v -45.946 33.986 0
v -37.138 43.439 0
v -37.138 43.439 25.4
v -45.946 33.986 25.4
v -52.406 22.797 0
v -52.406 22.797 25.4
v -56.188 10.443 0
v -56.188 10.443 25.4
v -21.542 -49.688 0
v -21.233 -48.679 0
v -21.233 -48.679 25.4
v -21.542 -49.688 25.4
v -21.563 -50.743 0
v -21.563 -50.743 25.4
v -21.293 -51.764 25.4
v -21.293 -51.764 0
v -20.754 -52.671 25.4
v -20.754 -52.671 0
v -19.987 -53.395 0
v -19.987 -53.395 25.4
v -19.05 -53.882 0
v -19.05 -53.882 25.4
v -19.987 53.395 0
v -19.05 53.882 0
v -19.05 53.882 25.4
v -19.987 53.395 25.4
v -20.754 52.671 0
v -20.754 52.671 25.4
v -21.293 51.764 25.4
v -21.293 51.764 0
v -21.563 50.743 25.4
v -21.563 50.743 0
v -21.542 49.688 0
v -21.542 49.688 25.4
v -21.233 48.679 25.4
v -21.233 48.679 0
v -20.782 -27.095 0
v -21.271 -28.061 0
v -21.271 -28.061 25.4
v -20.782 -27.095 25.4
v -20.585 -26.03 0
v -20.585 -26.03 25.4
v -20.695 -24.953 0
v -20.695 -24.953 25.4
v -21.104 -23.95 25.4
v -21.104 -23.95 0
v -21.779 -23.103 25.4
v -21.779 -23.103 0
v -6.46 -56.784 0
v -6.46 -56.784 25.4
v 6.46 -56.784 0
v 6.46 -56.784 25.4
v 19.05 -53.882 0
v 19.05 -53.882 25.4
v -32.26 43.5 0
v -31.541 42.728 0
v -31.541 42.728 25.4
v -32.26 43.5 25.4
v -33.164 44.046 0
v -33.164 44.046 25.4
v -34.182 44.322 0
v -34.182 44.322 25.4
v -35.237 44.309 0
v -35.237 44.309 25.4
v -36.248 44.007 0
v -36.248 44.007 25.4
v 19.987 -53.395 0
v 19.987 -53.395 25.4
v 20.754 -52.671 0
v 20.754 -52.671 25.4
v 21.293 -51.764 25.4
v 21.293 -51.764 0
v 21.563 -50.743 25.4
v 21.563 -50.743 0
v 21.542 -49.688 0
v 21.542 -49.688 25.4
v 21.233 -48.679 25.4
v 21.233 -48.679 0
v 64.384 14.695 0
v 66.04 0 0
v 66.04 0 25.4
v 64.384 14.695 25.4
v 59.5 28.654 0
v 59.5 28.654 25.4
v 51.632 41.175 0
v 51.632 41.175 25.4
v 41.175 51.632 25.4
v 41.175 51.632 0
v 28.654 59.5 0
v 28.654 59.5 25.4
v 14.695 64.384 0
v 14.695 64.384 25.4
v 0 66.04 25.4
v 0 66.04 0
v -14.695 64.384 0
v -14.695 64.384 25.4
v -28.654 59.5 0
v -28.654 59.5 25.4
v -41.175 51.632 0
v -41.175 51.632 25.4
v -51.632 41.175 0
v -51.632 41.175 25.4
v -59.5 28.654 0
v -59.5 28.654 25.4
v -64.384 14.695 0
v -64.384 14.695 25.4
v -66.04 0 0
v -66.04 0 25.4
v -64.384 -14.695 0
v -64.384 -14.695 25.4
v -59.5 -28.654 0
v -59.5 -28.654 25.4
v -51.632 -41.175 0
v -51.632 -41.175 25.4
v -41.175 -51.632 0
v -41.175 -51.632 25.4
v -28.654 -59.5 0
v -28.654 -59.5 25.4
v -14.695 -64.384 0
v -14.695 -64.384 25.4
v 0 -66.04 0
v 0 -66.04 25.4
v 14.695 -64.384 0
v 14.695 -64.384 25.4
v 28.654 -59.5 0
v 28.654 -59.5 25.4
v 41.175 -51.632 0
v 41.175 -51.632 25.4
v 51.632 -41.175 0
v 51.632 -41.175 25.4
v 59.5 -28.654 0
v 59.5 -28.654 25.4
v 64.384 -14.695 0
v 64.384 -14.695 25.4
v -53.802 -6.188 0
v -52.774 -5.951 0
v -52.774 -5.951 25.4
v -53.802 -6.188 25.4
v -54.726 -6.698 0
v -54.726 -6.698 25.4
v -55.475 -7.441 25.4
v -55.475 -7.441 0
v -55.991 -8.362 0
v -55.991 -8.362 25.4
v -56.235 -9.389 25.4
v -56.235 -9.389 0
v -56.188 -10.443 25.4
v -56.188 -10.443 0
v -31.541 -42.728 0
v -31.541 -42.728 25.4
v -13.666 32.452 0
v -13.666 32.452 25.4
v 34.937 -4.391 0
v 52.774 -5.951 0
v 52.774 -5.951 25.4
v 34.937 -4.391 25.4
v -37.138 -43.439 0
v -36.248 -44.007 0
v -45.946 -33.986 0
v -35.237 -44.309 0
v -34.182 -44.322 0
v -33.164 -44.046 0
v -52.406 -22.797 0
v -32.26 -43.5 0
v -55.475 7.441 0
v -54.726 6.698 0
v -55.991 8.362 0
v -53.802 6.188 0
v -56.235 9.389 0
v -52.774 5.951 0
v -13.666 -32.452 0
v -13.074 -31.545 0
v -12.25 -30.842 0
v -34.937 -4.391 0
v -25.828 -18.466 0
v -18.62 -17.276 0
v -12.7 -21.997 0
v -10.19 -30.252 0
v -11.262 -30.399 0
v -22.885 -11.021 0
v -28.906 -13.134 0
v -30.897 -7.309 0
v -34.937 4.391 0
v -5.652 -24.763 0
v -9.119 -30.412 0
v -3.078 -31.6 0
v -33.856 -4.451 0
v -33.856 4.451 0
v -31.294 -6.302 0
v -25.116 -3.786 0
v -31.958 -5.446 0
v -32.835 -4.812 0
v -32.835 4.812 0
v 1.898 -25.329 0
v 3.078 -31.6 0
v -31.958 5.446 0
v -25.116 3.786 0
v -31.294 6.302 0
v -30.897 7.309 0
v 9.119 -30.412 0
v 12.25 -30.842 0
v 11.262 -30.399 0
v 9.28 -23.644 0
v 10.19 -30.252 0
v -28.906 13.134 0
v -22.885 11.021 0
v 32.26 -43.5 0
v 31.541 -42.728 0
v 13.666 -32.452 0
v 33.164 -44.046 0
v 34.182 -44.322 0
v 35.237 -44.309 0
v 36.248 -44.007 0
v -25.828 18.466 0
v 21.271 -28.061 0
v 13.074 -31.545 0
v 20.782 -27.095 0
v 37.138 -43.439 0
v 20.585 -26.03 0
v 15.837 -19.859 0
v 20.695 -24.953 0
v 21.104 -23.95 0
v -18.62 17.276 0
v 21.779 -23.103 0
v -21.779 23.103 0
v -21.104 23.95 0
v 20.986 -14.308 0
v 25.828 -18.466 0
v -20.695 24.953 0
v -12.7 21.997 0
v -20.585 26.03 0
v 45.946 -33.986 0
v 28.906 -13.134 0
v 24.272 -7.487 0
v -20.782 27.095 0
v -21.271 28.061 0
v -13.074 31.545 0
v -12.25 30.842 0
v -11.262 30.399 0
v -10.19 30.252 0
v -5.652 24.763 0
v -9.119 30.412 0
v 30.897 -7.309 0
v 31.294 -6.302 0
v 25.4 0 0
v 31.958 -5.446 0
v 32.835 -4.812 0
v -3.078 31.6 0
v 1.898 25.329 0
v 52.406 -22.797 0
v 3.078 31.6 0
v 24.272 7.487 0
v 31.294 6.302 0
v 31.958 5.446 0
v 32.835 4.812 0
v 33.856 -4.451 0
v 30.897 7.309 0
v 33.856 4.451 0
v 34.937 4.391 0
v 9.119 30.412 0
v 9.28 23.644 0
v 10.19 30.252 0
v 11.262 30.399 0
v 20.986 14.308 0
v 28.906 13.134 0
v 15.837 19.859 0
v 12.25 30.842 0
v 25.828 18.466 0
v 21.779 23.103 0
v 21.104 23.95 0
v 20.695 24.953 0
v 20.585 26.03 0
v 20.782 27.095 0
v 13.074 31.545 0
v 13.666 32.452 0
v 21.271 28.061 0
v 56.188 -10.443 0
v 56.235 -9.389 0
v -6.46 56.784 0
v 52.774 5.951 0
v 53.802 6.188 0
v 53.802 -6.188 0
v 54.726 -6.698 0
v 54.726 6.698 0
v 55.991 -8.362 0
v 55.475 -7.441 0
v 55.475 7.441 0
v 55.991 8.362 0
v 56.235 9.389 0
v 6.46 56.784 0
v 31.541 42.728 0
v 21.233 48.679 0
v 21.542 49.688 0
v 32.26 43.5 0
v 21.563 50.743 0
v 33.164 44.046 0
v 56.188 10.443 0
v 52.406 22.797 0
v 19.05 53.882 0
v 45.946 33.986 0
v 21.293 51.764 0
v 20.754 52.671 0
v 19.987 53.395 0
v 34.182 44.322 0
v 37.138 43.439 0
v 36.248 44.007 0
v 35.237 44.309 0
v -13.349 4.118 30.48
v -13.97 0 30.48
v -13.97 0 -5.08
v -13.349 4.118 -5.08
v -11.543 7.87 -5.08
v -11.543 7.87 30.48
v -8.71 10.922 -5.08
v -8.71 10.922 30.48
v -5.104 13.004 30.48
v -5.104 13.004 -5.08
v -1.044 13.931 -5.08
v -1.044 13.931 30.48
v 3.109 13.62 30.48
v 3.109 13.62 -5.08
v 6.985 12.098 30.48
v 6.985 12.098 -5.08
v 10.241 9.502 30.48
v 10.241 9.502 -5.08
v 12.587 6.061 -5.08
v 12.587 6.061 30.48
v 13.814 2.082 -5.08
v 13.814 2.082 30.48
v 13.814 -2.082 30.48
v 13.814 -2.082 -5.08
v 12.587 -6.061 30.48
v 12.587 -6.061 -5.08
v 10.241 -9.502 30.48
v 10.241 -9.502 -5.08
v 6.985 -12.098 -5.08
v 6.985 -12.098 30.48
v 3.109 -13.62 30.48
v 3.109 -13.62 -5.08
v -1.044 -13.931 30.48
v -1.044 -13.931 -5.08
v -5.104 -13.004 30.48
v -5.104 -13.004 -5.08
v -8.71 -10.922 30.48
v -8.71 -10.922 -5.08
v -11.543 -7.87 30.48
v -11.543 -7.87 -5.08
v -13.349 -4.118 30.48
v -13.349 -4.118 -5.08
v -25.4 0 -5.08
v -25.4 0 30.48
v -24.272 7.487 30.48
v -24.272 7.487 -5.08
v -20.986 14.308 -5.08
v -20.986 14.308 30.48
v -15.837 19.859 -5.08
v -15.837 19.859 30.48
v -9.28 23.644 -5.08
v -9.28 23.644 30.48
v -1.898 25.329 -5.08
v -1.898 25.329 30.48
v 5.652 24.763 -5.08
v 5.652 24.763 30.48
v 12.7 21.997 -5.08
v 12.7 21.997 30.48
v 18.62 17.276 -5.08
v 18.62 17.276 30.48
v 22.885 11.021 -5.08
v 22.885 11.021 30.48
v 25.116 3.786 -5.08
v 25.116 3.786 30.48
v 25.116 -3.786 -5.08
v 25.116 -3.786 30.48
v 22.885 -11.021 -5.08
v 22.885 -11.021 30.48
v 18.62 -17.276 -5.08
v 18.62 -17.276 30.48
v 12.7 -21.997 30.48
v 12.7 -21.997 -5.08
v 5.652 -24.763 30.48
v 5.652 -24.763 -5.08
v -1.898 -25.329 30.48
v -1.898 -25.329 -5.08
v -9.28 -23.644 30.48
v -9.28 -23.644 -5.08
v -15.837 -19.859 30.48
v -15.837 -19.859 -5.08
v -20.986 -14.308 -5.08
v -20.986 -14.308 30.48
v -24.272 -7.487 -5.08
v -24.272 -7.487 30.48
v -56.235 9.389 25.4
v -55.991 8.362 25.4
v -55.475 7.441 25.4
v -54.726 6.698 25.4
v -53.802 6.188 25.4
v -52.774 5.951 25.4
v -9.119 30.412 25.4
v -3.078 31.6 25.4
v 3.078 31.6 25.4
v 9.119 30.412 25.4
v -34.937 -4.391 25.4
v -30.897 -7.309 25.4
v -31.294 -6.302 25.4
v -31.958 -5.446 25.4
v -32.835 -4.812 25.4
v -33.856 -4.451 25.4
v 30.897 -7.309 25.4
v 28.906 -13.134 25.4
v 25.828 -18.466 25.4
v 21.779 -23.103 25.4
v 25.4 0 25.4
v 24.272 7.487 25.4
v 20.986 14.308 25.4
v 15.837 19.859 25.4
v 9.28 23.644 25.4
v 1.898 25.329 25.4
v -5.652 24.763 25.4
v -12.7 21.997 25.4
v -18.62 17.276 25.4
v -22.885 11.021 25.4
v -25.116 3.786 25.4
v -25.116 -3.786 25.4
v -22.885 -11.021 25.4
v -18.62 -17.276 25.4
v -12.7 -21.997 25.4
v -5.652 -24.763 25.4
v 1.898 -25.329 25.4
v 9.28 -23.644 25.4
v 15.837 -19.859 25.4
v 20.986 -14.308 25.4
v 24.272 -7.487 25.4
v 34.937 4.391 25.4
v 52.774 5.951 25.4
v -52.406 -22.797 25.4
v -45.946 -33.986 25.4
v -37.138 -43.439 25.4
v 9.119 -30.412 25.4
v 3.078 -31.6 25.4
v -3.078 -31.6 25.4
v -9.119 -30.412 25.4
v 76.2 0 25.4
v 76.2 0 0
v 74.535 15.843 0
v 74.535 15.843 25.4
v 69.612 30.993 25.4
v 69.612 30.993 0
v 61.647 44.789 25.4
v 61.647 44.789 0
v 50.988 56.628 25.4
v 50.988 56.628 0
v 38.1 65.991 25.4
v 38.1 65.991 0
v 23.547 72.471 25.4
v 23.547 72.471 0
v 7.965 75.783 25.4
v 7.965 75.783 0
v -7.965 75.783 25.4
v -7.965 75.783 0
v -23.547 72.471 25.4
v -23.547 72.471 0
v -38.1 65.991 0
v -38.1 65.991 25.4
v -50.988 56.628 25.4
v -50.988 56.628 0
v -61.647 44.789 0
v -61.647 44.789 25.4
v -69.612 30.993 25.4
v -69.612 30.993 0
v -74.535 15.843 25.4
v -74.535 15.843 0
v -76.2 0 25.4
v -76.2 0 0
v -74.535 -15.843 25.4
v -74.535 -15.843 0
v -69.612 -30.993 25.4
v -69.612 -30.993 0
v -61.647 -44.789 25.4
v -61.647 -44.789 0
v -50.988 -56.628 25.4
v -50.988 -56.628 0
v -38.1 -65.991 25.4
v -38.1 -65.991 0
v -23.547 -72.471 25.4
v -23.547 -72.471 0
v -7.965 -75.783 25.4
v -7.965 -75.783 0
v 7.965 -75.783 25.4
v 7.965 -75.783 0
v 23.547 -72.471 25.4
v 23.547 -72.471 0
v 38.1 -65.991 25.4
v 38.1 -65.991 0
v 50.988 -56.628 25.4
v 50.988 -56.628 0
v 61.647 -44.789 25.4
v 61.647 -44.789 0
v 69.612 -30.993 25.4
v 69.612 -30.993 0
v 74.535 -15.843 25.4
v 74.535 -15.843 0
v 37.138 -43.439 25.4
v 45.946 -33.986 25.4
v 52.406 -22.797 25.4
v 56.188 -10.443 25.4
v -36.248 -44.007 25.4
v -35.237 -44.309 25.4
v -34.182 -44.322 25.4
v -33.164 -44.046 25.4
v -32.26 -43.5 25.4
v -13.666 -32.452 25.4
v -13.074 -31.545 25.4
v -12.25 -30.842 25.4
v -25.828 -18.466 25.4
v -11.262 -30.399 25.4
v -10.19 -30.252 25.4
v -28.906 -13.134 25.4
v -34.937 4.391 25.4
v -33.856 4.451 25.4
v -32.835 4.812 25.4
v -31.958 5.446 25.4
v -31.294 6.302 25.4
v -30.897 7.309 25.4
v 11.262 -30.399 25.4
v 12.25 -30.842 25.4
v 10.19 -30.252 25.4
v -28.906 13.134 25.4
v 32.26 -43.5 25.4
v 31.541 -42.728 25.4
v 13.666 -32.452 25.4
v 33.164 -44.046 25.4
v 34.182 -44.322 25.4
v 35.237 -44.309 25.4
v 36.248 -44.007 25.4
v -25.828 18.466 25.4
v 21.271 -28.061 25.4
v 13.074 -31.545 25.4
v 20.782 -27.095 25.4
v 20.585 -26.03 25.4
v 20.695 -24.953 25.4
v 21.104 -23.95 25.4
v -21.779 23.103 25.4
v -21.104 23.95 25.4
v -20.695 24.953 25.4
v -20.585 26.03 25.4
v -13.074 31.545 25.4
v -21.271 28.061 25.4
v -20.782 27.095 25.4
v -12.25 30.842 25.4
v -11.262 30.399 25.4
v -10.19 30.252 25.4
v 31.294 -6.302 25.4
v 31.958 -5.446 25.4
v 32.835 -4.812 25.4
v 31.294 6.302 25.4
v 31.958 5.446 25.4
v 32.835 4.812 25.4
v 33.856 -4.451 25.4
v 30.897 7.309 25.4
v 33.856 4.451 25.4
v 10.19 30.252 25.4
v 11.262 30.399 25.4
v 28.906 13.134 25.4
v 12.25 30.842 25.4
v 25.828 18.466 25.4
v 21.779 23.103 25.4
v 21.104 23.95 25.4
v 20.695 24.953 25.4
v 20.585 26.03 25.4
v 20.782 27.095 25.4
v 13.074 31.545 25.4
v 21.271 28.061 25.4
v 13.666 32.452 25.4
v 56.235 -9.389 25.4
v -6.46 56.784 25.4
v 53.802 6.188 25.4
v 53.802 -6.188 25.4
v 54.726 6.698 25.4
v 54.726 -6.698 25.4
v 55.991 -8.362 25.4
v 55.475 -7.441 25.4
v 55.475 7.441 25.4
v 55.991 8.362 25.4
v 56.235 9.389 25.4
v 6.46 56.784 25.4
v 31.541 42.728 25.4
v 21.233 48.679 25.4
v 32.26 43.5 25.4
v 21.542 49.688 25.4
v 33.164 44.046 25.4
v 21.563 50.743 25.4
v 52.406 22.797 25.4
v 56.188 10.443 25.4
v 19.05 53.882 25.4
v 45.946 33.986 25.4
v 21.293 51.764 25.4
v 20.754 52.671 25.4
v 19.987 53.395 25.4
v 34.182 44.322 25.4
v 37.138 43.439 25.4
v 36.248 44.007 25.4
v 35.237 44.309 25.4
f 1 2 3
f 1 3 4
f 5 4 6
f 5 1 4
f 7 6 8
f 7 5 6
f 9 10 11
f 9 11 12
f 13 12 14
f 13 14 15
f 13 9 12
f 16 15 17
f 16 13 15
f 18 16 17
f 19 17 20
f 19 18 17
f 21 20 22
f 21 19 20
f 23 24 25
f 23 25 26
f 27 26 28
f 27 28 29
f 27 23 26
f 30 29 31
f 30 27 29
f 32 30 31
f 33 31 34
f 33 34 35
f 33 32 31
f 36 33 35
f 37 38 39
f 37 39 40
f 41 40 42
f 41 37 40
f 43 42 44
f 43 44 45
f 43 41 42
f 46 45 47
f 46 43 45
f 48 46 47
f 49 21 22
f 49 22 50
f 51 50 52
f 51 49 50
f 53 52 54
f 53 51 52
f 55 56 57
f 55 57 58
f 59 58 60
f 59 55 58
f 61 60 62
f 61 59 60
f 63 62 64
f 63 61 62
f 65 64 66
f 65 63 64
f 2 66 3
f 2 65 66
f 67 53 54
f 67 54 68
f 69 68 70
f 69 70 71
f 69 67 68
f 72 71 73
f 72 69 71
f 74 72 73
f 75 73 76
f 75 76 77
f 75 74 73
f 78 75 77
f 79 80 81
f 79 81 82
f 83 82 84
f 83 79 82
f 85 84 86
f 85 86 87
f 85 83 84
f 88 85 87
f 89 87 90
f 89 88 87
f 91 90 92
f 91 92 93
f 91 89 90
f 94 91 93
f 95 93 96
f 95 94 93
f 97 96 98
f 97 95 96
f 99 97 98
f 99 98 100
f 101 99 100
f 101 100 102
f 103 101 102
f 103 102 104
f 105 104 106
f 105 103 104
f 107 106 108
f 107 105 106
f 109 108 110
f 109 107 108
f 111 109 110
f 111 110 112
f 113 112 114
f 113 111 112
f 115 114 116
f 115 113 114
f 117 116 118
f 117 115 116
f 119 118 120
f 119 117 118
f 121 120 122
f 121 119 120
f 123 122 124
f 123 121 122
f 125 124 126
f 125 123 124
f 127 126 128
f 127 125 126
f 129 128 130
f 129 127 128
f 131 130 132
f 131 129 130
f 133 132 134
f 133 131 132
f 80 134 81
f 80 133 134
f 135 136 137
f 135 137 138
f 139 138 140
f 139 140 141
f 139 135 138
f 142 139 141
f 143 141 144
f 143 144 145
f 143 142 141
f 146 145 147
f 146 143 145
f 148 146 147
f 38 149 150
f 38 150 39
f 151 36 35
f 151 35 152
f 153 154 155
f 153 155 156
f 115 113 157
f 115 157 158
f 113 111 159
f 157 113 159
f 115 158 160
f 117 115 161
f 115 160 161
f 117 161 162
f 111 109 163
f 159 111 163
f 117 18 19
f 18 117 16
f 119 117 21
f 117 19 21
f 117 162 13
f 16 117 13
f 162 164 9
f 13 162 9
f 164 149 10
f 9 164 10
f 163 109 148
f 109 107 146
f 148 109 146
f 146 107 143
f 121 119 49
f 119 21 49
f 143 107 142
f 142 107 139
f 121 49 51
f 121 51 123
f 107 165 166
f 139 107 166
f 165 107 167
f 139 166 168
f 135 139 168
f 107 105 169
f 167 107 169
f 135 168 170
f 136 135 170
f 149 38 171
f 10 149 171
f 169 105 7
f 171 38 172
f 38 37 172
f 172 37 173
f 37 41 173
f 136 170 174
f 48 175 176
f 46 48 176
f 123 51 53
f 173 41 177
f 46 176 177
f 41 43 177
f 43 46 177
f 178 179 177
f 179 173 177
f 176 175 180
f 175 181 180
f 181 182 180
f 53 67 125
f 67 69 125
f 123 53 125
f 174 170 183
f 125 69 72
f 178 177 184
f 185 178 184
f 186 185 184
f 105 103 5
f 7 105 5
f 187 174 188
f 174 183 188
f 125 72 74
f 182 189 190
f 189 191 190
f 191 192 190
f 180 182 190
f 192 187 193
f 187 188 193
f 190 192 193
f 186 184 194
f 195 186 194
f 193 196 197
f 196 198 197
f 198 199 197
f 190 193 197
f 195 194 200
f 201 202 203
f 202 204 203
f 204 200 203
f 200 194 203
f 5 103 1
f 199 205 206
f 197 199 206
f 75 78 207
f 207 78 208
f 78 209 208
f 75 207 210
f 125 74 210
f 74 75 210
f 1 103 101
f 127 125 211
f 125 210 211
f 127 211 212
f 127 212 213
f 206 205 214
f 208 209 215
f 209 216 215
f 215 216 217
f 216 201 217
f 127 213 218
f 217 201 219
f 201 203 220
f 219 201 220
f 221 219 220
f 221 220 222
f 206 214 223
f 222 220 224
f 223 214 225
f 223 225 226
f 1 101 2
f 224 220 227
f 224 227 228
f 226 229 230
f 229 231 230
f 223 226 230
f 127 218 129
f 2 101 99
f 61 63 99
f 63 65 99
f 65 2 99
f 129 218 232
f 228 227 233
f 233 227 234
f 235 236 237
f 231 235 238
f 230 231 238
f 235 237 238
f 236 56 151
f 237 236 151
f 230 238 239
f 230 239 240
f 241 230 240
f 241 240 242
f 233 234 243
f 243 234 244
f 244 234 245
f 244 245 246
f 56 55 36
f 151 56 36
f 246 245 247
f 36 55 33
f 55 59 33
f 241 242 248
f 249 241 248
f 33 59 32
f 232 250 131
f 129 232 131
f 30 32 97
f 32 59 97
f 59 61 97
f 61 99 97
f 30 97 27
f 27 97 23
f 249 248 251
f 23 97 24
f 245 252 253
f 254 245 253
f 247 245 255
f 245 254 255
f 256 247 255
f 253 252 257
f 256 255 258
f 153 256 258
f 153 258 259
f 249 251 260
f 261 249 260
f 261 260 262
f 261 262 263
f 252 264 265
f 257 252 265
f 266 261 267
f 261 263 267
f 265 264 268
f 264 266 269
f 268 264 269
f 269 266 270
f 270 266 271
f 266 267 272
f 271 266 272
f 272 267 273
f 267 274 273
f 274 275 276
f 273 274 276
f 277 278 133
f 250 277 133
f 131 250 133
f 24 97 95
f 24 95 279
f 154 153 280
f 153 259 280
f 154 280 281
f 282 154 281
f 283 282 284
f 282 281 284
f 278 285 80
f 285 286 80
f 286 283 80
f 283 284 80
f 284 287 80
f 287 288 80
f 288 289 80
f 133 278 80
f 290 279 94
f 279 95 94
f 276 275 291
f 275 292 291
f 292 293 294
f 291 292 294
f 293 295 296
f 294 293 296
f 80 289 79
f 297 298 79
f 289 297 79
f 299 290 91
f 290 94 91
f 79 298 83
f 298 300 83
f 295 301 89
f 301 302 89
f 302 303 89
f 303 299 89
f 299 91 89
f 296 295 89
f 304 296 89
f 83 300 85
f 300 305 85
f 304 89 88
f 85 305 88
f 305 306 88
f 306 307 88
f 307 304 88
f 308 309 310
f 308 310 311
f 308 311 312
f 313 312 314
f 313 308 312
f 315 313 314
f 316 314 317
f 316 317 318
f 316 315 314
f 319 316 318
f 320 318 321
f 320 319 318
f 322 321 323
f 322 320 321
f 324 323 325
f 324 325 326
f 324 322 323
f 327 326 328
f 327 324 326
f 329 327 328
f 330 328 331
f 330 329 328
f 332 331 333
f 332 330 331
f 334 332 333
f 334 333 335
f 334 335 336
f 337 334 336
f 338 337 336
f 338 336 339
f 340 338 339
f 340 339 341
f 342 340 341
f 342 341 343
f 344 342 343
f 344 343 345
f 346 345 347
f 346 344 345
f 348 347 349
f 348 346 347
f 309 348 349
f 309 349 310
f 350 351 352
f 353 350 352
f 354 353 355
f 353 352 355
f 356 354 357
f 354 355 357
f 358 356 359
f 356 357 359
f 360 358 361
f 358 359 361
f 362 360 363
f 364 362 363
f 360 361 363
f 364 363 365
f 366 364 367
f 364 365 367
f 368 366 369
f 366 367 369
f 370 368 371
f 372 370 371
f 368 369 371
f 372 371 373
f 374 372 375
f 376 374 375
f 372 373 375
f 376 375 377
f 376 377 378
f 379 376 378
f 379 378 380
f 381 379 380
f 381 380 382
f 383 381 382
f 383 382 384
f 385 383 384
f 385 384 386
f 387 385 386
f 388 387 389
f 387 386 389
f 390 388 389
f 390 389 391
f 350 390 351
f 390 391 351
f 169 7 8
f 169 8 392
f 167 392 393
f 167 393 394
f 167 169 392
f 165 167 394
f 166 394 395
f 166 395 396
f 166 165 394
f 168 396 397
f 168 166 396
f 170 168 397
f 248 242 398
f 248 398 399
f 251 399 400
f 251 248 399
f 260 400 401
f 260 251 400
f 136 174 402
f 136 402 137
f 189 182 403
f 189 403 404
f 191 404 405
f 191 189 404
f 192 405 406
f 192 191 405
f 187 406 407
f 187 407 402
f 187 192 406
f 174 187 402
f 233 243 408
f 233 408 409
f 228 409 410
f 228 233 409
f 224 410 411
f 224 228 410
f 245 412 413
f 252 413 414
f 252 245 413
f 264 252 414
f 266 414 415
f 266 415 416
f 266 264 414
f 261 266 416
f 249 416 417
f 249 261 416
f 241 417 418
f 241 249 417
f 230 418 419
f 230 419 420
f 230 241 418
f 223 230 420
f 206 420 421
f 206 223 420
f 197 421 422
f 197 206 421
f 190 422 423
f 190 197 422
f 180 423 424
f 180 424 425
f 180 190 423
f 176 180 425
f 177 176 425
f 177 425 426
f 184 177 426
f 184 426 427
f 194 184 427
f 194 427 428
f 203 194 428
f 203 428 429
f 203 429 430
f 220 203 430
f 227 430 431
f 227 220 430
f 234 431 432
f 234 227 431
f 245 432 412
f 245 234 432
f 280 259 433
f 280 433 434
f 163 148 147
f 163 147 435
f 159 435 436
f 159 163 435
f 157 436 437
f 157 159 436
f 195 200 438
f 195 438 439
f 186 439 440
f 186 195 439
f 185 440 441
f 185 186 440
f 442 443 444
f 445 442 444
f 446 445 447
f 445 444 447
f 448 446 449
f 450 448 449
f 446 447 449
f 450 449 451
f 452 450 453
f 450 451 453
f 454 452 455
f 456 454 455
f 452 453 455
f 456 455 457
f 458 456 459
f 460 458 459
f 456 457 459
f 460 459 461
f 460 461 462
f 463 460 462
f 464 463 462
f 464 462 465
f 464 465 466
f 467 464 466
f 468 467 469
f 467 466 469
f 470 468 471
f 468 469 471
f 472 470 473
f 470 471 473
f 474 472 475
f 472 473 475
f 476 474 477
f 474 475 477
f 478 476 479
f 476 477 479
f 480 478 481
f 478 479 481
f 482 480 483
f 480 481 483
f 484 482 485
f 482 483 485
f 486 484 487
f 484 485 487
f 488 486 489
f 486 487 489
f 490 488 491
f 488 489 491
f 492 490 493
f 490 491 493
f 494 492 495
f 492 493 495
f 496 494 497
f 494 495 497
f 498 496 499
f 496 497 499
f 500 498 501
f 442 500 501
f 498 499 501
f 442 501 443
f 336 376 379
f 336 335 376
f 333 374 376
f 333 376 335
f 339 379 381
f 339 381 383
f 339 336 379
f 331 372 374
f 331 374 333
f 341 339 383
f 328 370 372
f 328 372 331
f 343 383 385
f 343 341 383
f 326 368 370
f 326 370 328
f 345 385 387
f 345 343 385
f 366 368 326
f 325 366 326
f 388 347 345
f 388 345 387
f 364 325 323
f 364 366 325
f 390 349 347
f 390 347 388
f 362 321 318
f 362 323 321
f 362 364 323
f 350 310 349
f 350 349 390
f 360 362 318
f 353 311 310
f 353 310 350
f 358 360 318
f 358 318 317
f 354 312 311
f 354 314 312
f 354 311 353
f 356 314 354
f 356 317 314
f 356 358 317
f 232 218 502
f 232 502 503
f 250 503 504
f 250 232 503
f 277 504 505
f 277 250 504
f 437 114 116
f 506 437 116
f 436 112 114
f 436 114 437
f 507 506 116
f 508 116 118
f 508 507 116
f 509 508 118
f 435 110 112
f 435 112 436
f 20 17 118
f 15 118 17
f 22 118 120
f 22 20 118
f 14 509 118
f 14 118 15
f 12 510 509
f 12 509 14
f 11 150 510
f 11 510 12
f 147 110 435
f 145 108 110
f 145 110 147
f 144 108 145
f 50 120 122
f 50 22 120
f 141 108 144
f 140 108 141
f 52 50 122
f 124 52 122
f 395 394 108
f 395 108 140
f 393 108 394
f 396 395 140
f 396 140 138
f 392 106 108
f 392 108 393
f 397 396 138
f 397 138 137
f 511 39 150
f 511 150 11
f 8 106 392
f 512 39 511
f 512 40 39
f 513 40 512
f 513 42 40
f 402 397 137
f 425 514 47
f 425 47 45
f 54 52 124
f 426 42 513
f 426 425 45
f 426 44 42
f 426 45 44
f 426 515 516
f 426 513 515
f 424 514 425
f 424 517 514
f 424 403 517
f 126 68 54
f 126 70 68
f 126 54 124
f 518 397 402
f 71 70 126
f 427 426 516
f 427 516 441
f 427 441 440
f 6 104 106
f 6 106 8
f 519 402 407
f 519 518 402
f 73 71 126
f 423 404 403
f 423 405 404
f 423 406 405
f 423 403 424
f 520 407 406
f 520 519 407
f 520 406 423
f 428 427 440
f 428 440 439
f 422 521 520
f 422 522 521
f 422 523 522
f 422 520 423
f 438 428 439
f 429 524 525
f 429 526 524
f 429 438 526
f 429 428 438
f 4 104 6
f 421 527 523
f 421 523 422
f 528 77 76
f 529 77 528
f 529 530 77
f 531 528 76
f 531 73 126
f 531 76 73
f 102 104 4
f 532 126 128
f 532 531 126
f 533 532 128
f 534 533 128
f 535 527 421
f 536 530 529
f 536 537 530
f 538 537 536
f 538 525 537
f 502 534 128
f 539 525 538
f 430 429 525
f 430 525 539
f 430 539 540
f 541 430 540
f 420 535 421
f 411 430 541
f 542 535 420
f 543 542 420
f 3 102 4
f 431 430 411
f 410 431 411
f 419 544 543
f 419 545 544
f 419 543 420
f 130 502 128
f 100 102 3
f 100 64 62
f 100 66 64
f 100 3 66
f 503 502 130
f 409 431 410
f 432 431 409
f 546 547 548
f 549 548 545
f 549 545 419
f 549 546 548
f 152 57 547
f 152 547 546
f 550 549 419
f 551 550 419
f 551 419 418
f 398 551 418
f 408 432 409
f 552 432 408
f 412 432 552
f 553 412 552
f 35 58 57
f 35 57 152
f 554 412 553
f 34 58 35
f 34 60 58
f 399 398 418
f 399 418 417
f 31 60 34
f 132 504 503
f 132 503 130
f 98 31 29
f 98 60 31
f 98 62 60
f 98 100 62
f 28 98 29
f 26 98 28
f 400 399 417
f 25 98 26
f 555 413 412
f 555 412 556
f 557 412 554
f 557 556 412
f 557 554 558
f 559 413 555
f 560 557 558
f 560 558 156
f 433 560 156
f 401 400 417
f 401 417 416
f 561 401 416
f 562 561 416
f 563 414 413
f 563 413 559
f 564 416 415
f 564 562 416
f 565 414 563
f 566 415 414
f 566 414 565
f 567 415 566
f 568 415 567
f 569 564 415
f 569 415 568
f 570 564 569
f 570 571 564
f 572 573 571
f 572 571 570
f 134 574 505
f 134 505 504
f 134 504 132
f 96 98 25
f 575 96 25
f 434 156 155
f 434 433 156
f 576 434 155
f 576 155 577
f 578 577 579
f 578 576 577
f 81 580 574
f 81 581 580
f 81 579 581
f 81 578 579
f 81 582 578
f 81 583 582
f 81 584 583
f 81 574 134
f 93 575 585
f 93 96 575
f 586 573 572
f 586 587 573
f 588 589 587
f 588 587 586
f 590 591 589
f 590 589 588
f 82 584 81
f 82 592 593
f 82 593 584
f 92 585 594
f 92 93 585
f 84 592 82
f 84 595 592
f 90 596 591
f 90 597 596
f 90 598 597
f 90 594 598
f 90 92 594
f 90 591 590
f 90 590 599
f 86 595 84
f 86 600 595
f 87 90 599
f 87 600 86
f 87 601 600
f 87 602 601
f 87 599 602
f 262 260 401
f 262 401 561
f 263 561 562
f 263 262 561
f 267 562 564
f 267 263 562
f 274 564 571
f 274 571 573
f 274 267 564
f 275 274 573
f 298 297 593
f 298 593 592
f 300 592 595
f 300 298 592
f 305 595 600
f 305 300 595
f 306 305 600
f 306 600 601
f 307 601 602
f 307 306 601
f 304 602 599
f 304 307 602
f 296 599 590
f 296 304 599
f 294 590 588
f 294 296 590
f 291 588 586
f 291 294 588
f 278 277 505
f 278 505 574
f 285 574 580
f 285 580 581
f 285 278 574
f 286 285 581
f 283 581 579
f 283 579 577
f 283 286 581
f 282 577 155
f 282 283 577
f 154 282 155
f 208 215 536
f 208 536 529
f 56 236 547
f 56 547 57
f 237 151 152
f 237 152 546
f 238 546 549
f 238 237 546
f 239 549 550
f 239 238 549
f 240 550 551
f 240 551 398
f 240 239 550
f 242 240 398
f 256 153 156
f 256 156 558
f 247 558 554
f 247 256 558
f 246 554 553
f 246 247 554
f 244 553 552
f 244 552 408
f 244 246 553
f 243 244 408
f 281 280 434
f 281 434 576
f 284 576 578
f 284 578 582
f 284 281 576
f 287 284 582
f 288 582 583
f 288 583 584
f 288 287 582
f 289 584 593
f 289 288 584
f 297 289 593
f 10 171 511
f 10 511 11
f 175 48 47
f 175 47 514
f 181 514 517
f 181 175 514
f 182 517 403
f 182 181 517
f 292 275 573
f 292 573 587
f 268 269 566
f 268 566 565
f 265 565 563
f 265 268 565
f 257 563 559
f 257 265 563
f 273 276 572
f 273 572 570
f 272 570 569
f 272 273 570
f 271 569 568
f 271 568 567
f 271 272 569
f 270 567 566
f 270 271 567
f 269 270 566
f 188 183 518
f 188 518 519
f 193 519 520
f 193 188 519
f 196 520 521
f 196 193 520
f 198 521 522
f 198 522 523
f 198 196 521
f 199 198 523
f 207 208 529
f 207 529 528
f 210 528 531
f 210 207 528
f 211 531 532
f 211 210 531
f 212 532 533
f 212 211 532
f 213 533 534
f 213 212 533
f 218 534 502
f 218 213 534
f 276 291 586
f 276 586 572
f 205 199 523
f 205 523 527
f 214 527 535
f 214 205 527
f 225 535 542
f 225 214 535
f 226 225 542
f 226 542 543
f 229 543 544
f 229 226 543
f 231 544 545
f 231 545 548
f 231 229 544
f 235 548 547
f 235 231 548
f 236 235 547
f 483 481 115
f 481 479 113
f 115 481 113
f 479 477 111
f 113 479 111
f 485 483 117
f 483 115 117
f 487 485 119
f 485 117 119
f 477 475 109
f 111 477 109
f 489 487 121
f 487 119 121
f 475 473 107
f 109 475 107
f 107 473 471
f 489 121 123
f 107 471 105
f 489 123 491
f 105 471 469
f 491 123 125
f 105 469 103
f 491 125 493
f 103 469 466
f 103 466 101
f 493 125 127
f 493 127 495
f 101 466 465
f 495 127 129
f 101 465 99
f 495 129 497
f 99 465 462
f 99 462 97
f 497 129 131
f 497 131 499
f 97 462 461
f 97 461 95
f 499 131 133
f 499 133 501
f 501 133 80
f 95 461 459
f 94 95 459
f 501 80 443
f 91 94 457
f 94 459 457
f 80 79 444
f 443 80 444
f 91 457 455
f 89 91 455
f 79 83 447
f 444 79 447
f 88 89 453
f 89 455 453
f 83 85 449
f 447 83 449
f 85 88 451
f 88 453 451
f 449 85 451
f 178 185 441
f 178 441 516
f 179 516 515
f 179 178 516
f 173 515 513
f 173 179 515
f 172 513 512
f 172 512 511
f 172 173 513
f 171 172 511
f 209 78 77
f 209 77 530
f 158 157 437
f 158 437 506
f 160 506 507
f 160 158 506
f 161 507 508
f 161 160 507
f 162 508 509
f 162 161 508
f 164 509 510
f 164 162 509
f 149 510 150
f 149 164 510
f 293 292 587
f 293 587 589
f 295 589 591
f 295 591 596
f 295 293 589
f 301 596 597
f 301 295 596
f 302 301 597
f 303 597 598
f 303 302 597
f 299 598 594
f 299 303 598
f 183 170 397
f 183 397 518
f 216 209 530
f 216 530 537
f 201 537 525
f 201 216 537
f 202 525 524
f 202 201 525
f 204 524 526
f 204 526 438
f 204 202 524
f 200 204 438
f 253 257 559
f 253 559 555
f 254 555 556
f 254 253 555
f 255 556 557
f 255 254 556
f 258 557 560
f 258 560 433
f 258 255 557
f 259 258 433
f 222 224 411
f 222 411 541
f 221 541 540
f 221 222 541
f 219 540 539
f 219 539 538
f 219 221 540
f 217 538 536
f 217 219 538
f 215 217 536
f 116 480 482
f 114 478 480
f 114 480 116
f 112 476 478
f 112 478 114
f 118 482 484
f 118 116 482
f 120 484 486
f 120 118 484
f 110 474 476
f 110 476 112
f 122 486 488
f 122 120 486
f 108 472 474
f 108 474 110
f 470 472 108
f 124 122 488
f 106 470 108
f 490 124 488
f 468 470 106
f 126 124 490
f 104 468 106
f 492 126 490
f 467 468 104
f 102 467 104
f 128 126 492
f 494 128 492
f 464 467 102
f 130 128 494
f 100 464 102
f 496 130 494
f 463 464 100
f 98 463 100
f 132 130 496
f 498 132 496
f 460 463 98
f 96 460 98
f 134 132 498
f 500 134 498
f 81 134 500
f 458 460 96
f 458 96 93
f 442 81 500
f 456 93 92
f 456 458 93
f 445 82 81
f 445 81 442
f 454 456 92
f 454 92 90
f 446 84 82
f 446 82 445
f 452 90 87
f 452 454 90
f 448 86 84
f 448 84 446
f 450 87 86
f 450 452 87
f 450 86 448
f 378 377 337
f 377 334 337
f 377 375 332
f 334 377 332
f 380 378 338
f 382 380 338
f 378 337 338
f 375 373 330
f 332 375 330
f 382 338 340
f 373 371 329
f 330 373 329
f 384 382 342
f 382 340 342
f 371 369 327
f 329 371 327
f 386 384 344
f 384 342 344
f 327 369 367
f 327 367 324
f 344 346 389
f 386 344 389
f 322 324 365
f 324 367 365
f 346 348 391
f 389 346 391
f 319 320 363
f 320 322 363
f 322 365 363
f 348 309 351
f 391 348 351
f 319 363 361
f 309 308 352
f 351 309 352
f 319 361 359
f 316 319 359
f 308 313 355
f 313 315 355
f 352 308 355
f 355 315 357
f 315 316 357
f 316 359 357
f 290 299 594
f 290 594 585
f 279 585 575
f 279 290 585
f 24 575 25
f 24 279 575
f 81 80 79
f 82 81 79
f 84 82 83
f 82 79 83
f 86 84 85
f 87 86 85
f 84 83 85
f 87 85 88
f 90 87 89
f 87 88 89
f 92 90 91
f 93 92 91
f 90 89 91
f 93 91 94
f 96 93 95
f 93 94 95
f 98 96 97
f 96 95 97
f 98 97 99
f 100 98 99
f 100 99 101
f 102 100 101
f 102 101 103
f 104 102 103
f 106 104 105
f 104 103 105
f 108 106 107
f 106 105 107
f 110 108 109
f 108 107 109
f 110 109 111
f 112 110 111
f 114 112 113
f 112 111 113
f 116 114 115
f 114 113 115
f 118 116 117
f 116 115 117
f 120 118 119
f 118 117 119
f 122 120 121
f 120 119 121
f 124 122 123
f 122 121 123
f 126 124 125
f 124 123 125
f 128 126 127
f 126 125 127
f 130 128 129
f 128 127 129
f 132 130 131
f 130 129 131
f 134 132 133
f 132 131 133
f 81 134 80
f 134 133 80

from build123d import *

# Parameters (mm, degrees)
SKETCH1_R                = 76.2
SKETCH1_R_2              = 66.04
BOSS_EXTRUDE1_DEPTH      = 25.4
SKETCH2_R                = 66.04
SKETCH2_R_2              = 25.4
BOSS_EXTRUDE2_DEPTH      = 25.4
BOSS_EXTRUDE3_DEPTH      = 17.78
BOSS_EXTRUDE3_DEPTH_BACK = 17.78
SKETCH3_R                = 25.4
SKETCH3_R_2              = 13.97


with BuildPart() as part:
    # Sketch1 → Boss-Extrude1 (new body)
    with BuildSketch(Plane.XY):
        Circle(SKETCH1_R)
        Circle(SKETCH1_R_2, mode=Mode.SUBTRACT)
    extrude(amount=BOSS_EXTRUDE1_DEPTH)


with BuildPart() as body_2:
    # Sketch2 → Boss-Extrude2 (new body)
    with BuildSketch(Plane.XY):
        Circle(SKETCH2_R)
        Circle(SKETCH2_R_2, mode=Mode.SUBTRACT)
        with BuildLine():
            Line((13.665983216, 32.451668782), (21.233032669, 48.679258701))
            ThreePointArc((21.233032669, 48.679258701), (21.293215559, 51.763685423), (19.05, 53.881536726))
            ThreePointArc((19.05, 53.881536726), (0, 57.15), (-19.05, 53.881536726))
            ThreePointArc((-19.05, 53.881536726), (-21.293215559, 51.763685423), (-21.233032669, 48.679258701))
            Line((-21.233032669, 48.679258701), (-13.665983216, 32.451668782))
            ThreePointArc((-13.665983216, 32.451668782), (-11.772009299, 30.585433018), (-9.118705846, 30.412361035))
            ThreePointArc((-9.118705846, 30.412361035), (0, 31.75), (9.118705846, 30.412361035))
            ThreePointArc((9.118705846, 30.412361035), (11.772009299, 30.585433018), (13.665983216, 32.451668782))
        make_face(mode=Mode.SUBTRACT)
        with BuildLine():
            Line((34.936961168, 4.390745758), (52.773991007, 5.95128366))
            ThreePointArc((52.773991007, 5.95128366), (55.475274349, 7.44137711), (56.1877796, 10.442984421))
            ThreePointArc((56.1877796, 10.442984421), (49.493351826, 28.575), (37.1377796, 43.438552305))
            ThreePointArc((37.1377796, 43.438552305), (34.182058791, 44.322308314), (31.540958338, 42.727975041))
            Line((31.540958338, 42.727975041), (21.270977952, 28.060923023))
            ThreePointArc((21.270977952, 28.060923023), (20.60175733, 25.487575615), (21.778524322, 23.103211429))
            ThreePointArc((21.778524322, 23.103211429), (27.49630657, 15.875), (30.897230168, 7.309149605))
            ThreePointArc((30.897230168, 7.309149605), (32.373766629, 5.097857403), (34.936961168, 4.390745758))
        make_face(mode=Mode.SUBTRACT)
        with BuildLine():
            Line((21.270977952, -28.060923023), (31.540958338, -42.727975041))
            ThreePointArc((31.540958338, -42.727975041), (34.182058791, -44.322308314), (37.1377796, -43.438552305))
            ThreePointArc((37.1377796, -43.438552305), (49.493351826, -28.575), (56.1877796, -10.442984421))
            ThreePointArc((56.1877796, -10.442984421), (55.475274349, -7.44137711), (52.773991007, -5.95128366))
            Line((52.773991007, -5.95128366), (34.936961168, -4.390745758))
            ThreePointArc((34.936961168, -4.390745758), (32.373766629, -5.097857403), (30.897230168, -7.309149605))
            ThreePointArc((30.897230168, -7.309149605), (27.49630657, -15.875), (21.778524322, -23.103211429))
            ThreePointArc((21.778524322, -23.103211429), (20.60175733, -25.487575615), (21.270977952, -28.060923023))
        make_face(mode=Mode.SUBTRACT)
        with BuildLine():
            Line((-13.665983216, -32.451668782), (-21.233032669, -48.679258701))
            ThreePointArc((-21.233032669, -48.679258701), (-21.293215559, -51.763685423), (-19.05, -53.881536726))
            ThreePointArc((-19.05, -53.881536726), (0, -57.15), (19.05, -53.881536726))
            ThreePointArc((19.05, -53.881536726), (21.293215559, -51.763685423), (21.233032669, -48.679258701))
            Line((21.233032669, -48.679258701), (13.665983216, -32.451668782))
            ThreePointArc((13.665983216, -32.451668782), (11.772009299, -30.585433018), (9.118705846, -30.412361035))
            ThreePointArc((9.118705846, -30.412361035), (0, -31.75), (-9.118705846, -30.412361035))
            ThreePointArc((-9.118705846, -30.412361035), (-11.772009299, -30.585433018), (-13.665983216, -32.451668782))
        make_face(mode=Mode.SUBTRACT)
        with BuildLine():
            Line((-34.936961168, -4.390745758), (-52.773991007, -5.95128366))
            ThreePointArc((-52.773991007, -5.95128366), (-55.475274349, -7.44137711), (-56.1877796, -10.442984421))
            ThreePointArc((-56.1877796, -10.442984421), (-49.493351826, -28.575), (-37.1377796, -43.438552305))
            ThreePointArc((-37.1377796, -43.438552305), (-34.182058791, -44.322308314), (-31.540958338, -42.727975041))
            Line((-31.540958338, -42.727975041), (-21.270977952, -28.060923023))
            ThreePointArc((-21.270977952, -28.060923023), (-20.60175733, -25.487575615), (-21.778524322, -23.103211429))
            ThreePointArc((-21.778524322, -23.103211429), (-27.49630657, -15.875), (-30.897230168, -7.309149605))
            ThreePointArc((-30.897230168, -7.309149605), (-32.373766629, -5.097857403), (-34.936961168, -4.390745758))
        make_face(mode=Mode.SUBTRACT)
        with BuildLine():
            Line((-21.270977952, 28.060923023), (-31.540958338, 42.727975041))
            ThreePointArc((-31.540958338, 42.727975041), (-34.182058791, 44.322308314), (-37.1377796, 43.438552305))
            ThreePointArc((-37.1377796, 43.438552305), (-49.493351826, 28.575), (-56.1877796, 10.442984421))
            ThreePointArc((-56.1877796, 10.442984421), (-55.475274349, 7.44137711), (-52.773991007, 5.95128366))
            Line((-52.773991007, 5.95128366), (-34.936961168, 4.390745758))
            ThreePointArc((-34.936961168, 4.390745758), (-32.373766629, 5.097857403), (-30.897230168, 7.309149605))
            ThreePointArc((-30.897230168, 7.309149605), (-27.49630657, 15.875), (-21.778524322, 23.103211429))
            ThreePointArc((-21.778524322, 23.103211429), (-20.60175733, 25.487575615), (-21.270977952, 28.060923023))
        make_face(mode=Mode.SUBTRACT)
    extrude(amount=BOSS_EXTRUDE2_DEPTH)


with BuildPart() as body_3:
    # Sketch3 → Boss-Extrude3 (new, two sides: drawn at the far end of the back side and taken through both)
    with BuildSketch(Plane(origin=(0, 0, 12.7), x_dir=(-1, 0, 0), z_dir=(0, 0, -1)).offset(-BOSS_EXTRUDE3_DEPTH_BACK)):
        Circle(SKETCH3_R)
        Circle(SKETCH3_R_2, mode=Mode.SUBTRACT)
    extrude(amount=BOSS_EXTRUDE3_DEPTH + BOSS_EXTRUDE3_DEPTH_BACK)


solid = Compound([part.part, body_2.part, body_3.part])
